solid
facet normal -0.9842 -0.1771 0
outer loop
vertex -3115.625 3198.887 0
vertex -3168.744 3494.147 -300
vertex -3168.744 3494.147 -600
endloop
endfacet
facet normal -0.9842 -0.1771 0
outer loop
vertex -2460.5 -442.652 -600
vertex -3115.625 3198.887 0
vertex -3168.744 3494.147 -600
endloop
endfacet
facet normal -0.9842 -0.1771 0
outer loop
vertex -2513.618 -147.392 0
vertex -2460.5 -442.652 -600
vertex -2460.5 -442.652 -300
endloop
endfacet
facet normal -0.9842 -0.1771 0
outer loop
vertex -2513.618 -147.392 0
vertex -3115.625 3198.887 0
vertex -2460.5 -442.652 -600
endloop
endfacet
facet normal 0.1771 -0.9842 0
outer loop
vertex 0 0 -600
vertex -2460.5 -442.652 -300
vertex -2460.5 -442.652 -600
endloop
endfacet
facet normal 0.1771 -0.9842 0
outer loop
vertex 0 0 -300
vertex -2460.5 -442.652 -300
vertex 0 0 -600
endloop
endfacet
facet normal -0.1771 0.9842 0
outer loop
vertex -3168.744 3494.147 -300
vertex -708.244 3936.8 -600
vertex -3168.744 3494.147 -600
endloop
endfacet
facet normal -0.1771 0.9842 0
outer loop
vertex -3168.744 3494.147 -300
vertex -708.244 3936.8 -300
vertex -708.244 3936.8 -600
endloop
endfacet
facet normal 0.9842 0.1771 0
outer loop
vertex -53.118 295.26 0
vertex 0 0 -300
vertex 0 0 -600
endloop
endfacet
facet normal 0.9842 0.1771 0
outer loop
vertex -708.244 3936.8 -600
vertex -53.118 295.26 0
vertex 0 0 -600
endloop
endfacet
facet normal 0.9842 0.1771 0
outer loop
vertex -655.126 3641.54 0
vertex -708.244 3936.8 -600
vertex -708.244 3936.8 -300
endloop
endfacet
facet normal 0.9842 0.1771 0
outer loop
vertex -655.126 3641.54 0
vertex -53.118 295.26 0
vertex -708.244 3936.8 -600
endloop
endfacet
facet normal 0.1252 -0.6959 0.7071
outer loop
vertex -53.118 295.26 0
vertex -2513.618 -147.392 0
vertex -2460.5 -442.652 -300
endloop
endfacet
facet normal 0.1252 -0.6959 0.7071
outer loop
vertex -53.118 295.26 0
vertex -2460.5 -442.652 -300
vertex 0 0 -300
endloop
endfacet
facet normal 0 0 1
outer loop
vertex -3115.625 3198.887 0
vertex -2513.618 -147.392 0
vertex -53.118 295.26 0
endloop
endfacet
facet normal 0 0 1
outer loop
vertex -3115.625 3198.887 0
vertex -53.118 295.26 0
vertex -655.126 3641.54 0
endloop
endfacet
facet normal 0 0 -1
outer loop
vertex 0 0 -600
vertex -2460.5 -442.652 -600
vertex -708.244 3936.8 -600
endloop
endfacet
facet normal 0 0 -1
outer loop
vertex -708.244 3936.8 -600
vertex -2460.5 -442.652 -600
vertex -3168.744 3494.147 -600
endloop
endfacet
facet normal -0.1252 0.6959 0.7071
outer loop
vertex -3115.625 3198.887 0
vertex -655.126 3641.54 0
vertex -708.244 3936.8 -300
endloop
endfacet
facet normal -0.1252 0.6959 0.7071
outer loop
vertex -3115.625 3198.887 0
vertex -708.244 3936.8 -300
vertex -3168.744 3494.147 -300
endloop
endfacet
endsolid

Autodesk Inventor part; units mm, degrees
ref_plane "YZ Plane" through (0, 0, 0) normal (1, 0, 0) x (0, 1, 0)
ref_plane "XZ Plane" through (0, 0, 0) normal (0, 1, 0) x (-1, 0, 0)
ref_plane "Pracovní rovina1" through (2538.9606, 1040.5981, 0) normal (0, 0, 1) x (-0.177061, 0.9841999, 0)
sketch "Náčrt1" plane through (2538.9606, 1040.5981, 0) normal (0, 0, 1) x (-0.177061, 0.9841999, 0)
  line L0 (3425.3944, 5183.094) -> (-574.6056, 5183.094)
  line L1 (-574.6056, 5183.094) -> (-574.6056, 2683.094)
  line L2 (-574.6056, 2683.094) -> (3425.3944, 2683.094)
  line L3 (3425.3944, 2683.094) -> (3425.3944, 5183.094)
  dimension "d5" = 4000
  dimension "d6" = 2500
extrude "Vysunutí1" add sketch "Náčrt1" against normal blind 600
chamfer "Zkosení1" distance 300 angle 45 2 edges at (-1230.2498, -221.3263, 0) (-1938.4939, 3715.4732, 0)
properties part number "vozik"
